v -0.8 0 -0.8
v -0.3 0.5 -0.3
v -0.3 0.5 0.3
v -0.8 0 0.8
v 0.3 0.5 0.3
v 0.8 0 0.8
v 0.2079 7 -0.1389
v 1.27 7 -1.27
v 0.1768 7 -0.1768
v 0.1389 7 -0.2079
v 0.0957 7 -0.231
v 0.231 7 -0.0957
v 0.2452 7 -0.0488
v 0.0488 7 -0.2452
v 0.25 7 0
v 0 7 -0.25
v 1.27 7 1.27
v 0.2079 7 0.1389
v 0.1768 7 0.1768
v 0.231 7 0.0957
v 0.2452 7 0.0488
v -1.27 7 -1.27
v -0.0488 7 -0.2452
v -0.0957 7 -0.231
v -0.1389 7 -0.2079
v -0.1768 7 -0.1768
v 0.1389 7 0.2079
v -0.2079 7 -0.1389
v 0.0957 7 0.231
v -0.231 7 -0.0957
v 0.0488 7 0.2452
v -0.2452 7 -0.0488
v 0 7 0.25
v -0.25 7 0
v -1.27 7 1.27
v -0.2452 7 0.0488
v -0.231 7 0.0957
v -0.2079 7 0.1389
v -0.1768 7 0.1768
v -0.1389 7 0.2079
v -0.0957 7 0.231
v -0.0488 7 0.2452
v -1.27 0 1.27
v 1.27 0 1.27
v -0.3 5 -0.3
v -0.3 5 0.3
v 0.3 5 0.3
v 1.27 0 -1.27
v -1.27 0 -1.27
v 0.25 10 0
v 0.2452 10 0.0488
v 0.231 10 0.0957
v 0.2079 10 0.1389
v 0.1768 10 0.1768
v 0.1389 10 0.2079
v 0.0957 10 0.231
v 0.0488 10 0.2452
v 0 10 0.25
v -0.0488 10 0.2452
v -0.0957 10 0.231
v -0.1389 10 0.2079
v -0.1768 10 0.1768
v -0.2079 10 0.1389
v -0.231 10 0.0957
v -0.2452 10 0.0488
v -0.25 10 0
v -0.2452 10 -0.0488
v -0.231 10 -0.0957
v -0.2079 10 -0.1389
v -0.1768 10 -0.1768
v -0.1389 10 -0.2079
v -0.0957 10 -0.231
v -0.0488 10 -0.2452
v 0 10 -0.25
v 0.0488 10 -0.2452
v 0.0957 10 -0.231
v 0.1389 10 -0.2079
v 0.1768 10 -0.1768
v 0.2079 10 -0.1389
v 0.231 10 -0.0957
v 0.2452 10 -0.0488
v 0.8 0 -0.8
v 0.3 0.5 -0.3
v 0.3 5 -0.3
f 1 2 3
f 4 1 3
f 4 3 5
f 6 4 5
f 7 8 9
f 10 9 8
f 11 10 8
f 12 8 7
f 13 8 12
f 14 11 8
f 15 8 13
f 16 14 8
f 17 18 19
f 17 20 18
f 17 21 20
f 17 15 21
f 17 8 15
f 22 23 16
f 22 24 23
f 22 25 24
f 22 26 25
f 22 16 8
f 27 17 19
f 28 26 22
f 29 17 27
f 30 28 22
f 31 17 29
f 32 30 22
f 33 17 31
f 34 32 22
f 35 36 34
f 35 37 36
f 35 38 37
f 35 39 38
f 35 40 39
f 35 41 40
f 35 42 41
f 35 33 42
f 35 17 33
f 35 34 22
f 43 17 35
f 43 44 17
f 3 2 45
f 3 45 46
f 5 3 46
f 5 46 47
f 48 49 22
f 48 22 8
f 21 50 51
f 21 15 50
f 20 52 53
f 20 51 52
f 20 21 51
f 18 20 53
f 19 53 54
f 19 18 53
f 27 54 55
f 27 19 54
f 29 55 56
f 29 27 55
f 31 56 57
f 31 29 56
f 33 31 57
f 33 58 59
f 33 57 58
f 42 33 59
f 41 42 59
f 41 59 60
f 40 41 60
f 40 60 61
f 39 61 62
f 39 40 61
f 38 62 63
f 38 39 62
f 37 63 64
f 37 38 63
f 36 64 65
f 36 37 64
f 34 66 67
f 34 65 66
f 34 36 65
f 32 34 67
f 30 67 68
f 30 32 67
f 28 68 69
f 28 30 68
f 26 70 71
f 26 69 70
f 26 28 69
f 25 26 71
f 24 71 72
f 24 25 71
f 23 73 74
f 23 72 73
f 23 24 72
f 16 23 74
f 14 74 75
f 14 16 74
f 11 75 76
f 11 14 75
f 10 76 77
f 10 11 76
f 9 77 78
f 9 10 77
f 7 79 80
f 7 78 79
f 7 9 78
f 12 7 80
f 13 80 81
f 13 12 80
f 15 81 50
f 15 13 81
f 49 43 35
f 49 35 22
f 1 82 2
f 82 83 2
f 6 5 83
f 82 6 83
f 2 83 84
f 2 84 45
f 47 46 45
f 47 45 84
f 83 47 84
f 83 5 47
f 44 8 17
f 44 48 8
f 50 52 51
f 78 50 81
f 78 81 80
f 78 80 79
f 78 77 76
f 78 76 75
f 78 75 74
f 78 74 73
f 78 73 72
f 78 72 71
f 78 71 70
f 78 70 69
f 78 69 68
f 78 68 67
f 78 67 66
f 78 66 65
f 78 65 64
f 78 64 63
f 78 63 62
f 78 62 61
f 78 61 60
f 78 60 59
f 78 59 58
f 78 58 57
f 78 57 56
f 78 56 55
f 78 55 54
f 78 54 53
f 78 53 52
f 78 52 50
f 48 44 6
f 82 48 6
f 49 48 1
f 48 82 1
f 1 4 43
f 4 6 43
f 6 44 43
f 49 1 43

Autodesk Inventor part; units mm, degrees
ref_plane "YZ Plane" through (0, 0, 0) normal (1, 0, 0) x (0, 1, 0)
ref_plane "XZ Plane" through (0, 0, 0) normal (0, 1, 0) x (-1, 0, 0)
ref_plane "XY Plane" through (0, 0, 0) normal (0, 0, 1) x (1, 0, 0)
sketch "Sketch1" plane through (0, 0, 0) normal (0, 1, 0) x (-1, 0, 0)
  line L0 (1.27, -1.27) -> (-1.27, -1.27)
  line L1 (-1.27, -1.27) -> (-1.27, 1.27)
  line L2 (-1.27, 1.27) -> (1.27, 1.27)
  line L3 (1.27, 1.27) -> (1.27, -1.27)
  point P0 (0, 0)
  point P1 (0, -1.27)
  point P2 (1.27, 0)
  dimension "d2" = 2.54
extrude "Extrusion1" add sketch "Sketch1" along normal blind 7
sketch "Sketch6" plane through (0, 7, 0) normal (0, 1, 0) x (1, 0, 0)
  circle A0 centre (0, 0) radius 0.25
  dimension "d19" = 0.5
sketch "Sketch7" plane through (0, 0, 0) normal (0, -1, 0) x (1, 0, 0)
  line L0 (-0.3, 0.3) -> (0.3, 0.3)
  line L1 (0.3, 0.3) -> (0.3, -0.3)
  line L2 (0.3, -0.3) -> (-0.3, -0.3)
  line L3 (-0.3, -0.3) -> (-0.3, 0.3)
  point P0 (0, 0)
  point P1 (0, 0.3)
  point P2 (-0.3, 0)
  dimension "d20" = 0.6
extrude "Extrusion4" cut sketch "Sketch7" against normal blind 5
chamfer "Chamfer1" distance 0.5 angle 45 4 edges at (0, 0, 0.3) (0.3, 0, 0) (0, 0, -0.3) (-0.3, 0, 0)
extrude "Extrusion5" add sketch "Sketch6" along normal blind 3
properties part number "Pin-round-2.54-female"
